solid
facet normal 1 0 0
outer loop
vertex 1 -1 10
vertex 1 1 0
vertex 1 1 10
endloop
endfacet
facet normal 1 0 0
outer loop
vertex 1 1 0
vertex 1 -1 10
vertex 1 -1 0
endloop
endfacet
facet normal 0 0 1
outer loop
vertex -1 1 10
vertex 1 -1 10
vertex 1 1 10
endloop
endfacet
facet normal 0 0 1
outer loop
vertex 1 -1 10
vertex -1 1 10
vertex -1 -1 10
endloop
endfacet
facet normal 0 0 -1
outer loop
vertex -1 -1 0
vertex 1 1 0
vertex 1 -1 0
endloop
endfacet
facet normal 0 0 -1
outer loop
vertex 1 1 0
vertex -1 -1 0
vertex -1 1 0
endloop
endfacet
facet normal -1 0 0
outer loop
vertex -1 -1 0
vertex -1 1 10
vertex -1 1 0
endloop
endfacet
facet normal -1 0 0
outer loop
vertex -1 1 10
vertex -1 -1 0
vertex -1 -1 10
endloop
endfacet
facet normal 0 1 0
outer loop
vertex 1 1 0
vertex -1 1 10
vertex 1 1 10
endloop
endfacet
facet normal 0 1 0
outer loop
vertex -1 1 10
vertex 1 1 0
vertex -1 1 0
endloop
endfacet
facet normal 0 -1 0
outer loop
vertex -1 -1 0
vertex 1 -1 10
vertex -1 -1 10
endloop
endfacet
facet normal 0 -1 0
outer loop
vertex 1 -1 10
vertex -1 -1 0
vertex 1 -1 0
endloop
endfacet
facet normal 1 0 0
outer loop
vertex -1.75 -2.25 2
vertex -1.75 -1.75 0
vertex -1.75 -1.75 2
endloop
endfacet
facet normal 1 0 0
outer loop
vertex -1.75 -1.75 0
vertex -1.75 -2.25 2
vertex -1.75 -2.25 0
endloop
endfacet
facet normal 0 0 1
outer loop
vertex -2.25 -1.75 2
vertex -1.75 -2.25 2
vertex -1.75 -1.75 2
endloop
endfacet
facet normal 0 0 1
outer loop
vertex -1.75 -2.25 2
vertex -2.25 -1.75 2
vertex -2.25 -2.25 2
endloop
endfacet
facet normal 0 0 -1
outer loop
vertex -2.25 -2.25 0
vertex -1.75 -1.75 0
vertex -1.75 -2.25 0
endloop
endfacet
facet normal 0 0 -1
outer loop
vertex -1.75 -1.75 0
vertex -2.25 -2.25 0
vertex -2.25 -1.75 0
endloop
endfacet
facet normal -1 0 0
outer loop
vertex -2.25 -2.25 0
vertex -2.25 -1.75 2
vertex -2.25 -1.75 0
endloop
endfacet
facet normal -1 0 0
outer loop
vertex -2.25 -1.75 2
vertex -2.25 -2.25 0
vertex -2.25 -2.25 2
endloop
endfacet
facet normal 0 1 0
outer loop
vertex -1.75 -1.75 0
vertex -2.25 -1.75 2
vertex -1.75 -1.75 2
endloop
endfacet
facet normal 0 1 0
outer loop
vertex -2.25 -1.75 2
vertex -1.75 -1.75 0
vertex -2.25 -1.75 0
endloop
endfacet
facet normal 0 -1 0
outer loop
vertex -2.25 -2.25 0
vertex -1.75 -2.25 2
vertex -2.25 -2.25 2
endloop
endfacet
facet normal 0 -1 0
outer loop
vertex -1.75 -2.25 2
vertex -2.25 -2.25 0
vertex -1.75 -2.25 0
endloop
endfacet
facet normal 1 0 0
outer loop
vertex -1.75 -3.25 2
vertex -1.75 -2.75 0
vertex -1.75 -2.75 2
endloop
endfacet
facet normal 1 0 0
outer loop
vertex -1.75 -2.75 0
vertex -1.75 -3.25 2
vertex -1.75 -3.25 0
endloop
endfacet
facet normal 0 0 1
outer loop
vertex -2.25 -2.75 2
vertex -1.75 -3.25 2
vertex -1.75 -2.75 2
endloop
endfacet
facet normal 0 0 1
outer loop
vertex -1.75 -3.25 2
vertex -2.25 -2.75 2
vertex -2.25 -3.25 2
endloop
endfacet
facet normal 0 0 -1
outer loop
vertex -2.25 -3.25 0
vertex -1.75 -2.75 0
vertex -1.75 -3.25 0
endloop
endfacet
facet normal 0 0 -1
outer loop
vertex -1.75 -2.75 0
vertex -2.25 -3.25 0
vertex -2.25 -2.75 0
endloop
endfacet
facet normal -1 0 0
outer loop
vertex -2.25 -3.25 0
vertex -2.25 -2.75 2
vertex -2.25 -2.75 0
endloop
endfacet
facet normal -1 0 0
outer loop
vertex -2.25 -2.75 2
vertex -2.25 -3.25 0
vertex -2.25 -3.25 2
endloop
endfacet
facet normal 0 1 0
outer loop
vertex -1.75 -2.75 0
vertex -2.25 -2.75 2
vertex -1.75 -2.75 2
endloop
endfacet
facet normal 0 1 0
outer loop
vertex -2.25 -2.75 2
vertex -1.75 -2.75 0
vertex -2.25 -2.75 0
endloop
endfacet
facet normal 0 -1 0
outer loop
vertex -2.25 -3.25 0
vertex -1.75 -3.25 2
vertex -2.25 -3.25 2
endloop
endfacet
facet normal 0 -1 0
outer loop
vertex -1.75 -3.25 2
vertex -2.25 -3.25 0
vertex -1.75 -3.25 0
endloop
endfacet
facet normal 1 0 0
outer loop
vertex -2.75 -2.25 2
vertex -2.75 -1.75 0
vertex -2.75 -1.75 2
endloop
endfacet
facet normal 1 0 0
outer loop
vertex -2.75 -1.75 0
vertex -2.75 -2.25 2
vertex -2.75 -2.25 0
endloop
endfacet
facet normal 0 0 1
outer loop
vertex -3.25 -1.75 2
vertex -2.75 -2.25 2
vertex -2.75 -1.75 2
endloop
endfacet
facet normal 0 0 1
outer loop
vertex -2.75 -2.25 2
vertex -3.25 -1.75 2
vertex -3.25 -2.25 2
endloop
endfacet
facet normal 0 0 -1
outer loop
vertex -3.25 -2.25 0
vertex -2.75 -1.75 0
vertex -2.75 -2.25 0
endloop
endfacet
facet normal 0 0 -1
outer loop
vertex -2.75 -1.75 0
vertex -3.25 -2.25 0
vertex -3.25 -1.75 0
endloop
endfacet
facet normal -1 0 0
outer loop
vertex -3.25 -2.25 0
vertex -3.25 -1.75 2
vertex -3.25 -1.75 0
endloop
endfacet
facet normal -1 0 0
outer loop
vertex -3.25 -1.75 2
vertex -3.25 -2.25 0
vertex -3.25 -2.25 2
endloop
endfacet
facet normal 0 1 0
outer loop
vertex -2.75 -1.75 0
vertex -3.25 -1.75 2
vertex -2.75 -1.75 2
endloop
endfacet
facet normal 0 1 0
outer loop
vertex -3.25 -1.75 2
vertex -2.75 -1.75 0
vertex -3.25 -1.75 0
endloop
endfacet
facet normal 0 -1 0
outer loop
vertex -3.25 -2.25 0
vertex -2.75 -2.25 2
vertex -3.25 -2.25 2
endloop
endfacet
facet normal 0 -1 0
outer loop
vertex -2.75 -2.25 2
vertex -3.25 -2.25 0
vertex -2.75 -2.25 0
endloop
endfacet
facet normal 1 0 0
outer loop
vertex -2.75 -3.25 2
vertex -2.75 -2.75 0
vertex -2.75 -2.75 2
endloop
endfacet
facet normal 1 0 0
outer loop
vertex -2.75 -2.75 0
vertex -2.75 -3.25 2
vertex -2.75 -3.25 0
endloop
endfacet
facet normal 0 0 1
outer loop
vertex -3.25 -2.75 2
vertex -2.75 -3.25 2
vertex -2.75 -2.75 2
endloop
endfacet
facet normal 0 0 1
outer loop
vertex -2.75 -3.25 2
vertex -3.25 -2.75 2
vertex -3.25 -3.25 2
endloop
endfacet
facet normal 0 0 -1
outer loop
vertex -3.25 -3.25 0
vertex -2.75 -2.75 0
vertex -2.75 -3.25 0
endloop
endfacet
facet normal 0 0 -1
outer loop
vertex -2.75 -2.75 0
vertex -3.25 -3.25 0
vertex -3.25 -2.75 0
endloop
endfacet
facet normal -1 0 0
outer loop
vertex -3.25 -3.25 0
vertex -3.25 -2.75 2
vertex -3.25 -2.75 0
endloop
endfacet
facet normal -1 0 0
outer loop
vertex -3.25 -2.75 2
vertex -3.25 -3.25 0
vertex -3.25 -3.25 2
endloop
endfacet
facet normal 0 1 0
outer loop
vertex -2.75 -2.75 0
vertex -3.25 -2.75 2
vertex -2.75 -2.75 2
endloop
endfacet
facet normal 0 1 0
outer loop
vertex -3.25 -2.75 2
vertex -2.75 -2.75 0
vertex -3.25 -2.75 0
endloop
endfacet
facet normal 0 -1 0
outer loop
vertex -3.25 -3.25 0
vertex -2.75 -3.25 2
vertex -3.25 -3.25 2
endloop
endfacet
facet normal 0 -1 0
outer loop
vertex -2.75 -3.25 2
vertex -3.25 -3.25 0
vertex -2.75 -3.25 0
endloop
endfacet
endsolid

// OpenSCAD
translate([0, 0, 5]) color([0,1,0,0.9]) cube([2, 2, 10], center=true);
translate([-2.0, -2.0, 1]) color([1,0,0]) cube([0.5, 0.5, 2], center=true);
translate([-2.0, -3.0, 1]) color([1,0,0]) cube([0.5, 0.5, 2], center=true);
translate([-3.0, -2.0, 1]) color([1,0,0]) cube([0.5, 0.5, 2], center=true);
translate([-3.0, -3.0, 1]) color([1,0,0]) cube([0.5, 0.5, 2], center=true);
